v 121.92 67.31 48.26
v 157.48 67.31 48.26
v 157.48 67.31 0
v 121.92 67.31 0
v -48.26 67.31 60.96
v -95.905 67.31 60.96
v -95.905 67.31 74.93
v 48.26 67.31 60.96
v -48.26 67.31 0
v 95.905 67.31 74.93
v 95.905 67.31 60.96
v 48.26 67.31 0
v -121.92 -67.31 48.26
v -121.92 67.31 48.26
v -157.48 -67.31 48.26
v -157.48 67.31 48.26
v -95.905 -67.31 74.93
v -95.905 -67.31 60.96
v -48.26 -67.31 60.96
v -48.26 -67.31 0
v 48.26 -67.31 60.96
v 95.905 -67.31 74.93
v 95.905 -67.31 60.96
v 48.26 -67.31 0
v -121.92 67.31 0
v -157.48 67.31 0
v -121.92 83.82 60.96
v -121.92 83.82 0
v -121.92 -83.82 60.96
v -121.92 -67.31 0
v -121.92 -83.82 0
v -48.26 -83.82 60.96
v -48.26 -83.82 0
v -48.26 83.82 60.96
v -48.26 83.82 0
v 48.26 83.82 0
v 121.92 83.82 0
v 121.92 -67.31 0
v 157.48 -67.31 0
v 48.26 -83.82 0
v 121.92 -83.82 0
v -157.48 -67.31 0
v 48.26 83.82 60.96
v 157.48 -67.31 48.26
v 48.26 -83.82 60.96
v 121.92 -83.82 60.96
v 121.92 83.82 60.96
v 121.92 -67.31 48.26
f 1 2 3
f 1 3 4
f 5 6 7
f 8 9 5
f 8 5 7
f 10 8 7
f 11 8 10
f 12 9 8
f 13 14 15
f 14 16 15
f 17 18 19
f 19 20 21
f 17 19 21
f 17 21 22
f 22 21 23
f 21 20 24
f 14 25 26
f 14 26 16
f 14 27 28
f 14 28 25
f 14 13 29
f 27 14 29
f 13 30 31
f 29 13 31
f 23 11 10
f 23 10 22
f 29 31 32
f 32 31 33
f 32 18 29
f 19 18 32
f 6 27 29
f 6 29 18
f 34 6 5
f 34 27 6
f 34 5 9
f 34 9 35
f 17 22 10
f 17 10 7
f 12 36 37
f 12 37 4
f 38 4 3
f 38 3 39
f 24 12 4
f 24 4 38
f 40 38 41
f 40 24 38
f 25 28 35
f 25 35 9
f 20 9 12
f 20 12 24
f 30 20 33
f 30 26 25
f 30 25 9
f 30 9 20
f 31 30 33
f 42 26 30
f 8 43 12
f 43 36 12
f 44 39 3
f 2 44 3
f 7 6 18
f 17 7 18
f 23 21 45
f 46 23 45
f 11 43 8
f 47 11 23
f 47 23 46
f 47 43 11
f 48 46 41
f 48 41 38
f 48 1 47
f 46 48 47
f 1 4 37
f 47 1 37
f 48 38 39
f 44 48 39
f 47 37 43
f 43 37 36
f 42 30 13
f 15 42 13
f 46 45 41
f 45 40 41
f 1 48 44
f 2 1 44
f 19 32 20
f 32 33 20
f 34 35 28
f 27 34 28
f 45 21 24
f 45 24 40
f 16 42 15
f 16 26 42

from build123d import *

# Parameters (mm, degrees)
F1_DEPTH   = 48.26
F2_W       = 35.56
F2_H       = 15.24
F3_DEPTH   = 25.4
F4_DEPTH   = 73.66
F5_START   = -73.66
F4_FACE_W  = 15.24
F4_FACE_H  = 25.4
F5_DEPTH   = 78.74
F6_DEPTH   = 22.86
F7_START   = 96.52
F6_FACE_W  = 15.24
F6_FACE_H  = 48.26
F7_DEPTH   = 73.66
F9_W       = 157.48
F9_H       = 67.31
F10_DEPTH  = 48.26
F11_W      = 35.56
F11_H      = 48.26
F12_DEPTH  = 16.51
F13_DEPTH  = 73.66
F14_START  = -73.66
F13_FACE_W = 16.51
F13_FACE_H = 48.26
F14_DEPTH  = 78.74
F18_DEPTH  = 12.7
F19_W      = 35.56
F19_H      = 134.62
F20_DEPTH  = 12.7
F22_DEPTH  = 13.97


with BuildPart() as f1:
    # F0 (on Top) → F1 (new body)
    with BuildSketch(Plane.XY):
        Polygon((0, 134.62), (0, 0), (314.96, 0), (314.96, 134.62), (35.56, 134.62), align=None)
    extrude(amount=F1_DEPTH)

    # F2 (on face) → F3 (join)
    with BuildSketch(Plane.XY.offset(48.26)):
        with Locations((17.78, 142.24)):
            Rectangle(F2_W, F2_H)
    extrude(amount=-F3_DEPTH)

    # F4 (add): a face of the model
    f4_faces = [f1.faces().sort_by_distance(p)[0] for p in [
        (35.56, 142.24, 35.56),
    ]]
    extrude(f4_faces, amount=F4_DEPTH)

    # F4_face (on face) → F5 (cut)
    with BuildSketch(Plane(origin=(109.22, 142.24, 35.56), x_dir=(0, 1, 0), z_dir=(1, 0, 0)).offset(F5_START)):
        Rectangle(F4_FACE_W, F4_FACE_H)
    extrude(amount=-F5_DEPTH, mode=Mode.SUBTRACT)

    # F6 (add): a face of the model
    f6_faces = [f1.faces().sort_by_distance(p)[0] for p in [
        (72.39, 142.24, 22.86),
    ]]
    extrude(f6_faces, amount=F6_DEPTH)

    # F6_face (on face) → F7 (join)
    with BuildSketch(Plane(origin=(109.22, 142.24, 24.13), x_dir=(0, 1, 0), z_dir=(1, 0, 0)).offset(F7_START)):
        Rectangle(F6_FACE_W, F6_FACE_H)
    extrude(amount=F7_DEPTH)


with BuildPart() as f10:
    # F9 (on Top) → F10 (new body)
    with BuildSketch(Plane.XY):
        with Locations((78.74, 33.655)):
            Rectangle(F9_W, F9_H)
    extrude(amount=F10_DEPTH)

    # F11 (on face) → F12 (join)
    with BuildSketch(Plane(origin=(0, 67.31, 0), x_dir=(-1, 0, 0), z_dir=(0, 1, 0))):
        with Locations((-139.7, 24.13)):
            Rectangle(F11_W, F11_H)
    extrude(amount=F12_DEPTH)

    # F13 (add): a face of the model
    f13_faces = [f10.faces().sort_by_distance(p)[0] for p in [
        (121.92, 75.565, 24.13),
    ]]
    extrude(f13_faces, amount=F13_DEPTH)

    # F13_face (on face) → F14 (cut)
    with BuildSketch(Plane(origin=(48.26, 75.565, 24.13), x_dir=(0, -1, 0), z_dir=(-1, 0, 0)).offset(F14_START)):
        Rectangle(F13_FACE_W, F13_FACE_H)
    extrude(amount=-F14_DEPTH, mode=Mode.SUBTRACT)

    # F15: F10 across plane


with BuildPart() as f10_1:
    add(f10.part)
    add(f10.part.mirror(Plane.XZ))

    # F16: F10 across plane


with BuildPart() as f10_2:
    add(f10_1.part)
    add(f10_1.part.mirror(Plane.YZ))

    # F17 (on face) → F18 (join)
    with BuildSketch(Plane.XY.offset(48.26)):
        Polygon((-121.92, 83.82), (-121.92, 67.31), (-121.92, -67.31), (-121.92, -83.82), (-48.26, -83.82), (-48.26, -67.31), (48.26, -67.31), (48.26, -83.82), (121.92, -83.82), (121.92, -67.31), (157.48, -67.31), (157.48, 67.31), (121.92, 67.31), (121.92, 83.82), (48.26, 83.82), (48.26, 67.31), (-48.26, 67.31), (-48.26, 83.82), align=None)
    extrude(amount=F18_DEPTH)

    # F19 (on face) → F20 (cut)
    with BuildSketch(Plane.XY.offset(60.96)):
        with Locations((139.7, 0)):
            Rectangle(F19_W, F19_H)
    extrude(amount=-F20_DEPTH, mode=Mode.SUBTRACT)

    # F21 (on face) → F22 (join)
    with BuildSketch(Plane.XY.offset(60.96)):
        Polygon((48.26, 67.31), (0, 67.31), (0, 0), (95.9053188562, 0), (95.9053188562, 67.31), align=None)
    extrude(amount=F22_DEPTH)

    # F23: F10 across plane


with BuildPart() as f10_3:
    add(f10_2.part)
    add(f10_2.part.mirror(Plane.XZ))

    # F24: F10 across plane


with BuildPart() as f10_4:
    add(f10_3.part)
    add(f10_3.part.mirror(Plane.YZ))


solid = f10_4.part
